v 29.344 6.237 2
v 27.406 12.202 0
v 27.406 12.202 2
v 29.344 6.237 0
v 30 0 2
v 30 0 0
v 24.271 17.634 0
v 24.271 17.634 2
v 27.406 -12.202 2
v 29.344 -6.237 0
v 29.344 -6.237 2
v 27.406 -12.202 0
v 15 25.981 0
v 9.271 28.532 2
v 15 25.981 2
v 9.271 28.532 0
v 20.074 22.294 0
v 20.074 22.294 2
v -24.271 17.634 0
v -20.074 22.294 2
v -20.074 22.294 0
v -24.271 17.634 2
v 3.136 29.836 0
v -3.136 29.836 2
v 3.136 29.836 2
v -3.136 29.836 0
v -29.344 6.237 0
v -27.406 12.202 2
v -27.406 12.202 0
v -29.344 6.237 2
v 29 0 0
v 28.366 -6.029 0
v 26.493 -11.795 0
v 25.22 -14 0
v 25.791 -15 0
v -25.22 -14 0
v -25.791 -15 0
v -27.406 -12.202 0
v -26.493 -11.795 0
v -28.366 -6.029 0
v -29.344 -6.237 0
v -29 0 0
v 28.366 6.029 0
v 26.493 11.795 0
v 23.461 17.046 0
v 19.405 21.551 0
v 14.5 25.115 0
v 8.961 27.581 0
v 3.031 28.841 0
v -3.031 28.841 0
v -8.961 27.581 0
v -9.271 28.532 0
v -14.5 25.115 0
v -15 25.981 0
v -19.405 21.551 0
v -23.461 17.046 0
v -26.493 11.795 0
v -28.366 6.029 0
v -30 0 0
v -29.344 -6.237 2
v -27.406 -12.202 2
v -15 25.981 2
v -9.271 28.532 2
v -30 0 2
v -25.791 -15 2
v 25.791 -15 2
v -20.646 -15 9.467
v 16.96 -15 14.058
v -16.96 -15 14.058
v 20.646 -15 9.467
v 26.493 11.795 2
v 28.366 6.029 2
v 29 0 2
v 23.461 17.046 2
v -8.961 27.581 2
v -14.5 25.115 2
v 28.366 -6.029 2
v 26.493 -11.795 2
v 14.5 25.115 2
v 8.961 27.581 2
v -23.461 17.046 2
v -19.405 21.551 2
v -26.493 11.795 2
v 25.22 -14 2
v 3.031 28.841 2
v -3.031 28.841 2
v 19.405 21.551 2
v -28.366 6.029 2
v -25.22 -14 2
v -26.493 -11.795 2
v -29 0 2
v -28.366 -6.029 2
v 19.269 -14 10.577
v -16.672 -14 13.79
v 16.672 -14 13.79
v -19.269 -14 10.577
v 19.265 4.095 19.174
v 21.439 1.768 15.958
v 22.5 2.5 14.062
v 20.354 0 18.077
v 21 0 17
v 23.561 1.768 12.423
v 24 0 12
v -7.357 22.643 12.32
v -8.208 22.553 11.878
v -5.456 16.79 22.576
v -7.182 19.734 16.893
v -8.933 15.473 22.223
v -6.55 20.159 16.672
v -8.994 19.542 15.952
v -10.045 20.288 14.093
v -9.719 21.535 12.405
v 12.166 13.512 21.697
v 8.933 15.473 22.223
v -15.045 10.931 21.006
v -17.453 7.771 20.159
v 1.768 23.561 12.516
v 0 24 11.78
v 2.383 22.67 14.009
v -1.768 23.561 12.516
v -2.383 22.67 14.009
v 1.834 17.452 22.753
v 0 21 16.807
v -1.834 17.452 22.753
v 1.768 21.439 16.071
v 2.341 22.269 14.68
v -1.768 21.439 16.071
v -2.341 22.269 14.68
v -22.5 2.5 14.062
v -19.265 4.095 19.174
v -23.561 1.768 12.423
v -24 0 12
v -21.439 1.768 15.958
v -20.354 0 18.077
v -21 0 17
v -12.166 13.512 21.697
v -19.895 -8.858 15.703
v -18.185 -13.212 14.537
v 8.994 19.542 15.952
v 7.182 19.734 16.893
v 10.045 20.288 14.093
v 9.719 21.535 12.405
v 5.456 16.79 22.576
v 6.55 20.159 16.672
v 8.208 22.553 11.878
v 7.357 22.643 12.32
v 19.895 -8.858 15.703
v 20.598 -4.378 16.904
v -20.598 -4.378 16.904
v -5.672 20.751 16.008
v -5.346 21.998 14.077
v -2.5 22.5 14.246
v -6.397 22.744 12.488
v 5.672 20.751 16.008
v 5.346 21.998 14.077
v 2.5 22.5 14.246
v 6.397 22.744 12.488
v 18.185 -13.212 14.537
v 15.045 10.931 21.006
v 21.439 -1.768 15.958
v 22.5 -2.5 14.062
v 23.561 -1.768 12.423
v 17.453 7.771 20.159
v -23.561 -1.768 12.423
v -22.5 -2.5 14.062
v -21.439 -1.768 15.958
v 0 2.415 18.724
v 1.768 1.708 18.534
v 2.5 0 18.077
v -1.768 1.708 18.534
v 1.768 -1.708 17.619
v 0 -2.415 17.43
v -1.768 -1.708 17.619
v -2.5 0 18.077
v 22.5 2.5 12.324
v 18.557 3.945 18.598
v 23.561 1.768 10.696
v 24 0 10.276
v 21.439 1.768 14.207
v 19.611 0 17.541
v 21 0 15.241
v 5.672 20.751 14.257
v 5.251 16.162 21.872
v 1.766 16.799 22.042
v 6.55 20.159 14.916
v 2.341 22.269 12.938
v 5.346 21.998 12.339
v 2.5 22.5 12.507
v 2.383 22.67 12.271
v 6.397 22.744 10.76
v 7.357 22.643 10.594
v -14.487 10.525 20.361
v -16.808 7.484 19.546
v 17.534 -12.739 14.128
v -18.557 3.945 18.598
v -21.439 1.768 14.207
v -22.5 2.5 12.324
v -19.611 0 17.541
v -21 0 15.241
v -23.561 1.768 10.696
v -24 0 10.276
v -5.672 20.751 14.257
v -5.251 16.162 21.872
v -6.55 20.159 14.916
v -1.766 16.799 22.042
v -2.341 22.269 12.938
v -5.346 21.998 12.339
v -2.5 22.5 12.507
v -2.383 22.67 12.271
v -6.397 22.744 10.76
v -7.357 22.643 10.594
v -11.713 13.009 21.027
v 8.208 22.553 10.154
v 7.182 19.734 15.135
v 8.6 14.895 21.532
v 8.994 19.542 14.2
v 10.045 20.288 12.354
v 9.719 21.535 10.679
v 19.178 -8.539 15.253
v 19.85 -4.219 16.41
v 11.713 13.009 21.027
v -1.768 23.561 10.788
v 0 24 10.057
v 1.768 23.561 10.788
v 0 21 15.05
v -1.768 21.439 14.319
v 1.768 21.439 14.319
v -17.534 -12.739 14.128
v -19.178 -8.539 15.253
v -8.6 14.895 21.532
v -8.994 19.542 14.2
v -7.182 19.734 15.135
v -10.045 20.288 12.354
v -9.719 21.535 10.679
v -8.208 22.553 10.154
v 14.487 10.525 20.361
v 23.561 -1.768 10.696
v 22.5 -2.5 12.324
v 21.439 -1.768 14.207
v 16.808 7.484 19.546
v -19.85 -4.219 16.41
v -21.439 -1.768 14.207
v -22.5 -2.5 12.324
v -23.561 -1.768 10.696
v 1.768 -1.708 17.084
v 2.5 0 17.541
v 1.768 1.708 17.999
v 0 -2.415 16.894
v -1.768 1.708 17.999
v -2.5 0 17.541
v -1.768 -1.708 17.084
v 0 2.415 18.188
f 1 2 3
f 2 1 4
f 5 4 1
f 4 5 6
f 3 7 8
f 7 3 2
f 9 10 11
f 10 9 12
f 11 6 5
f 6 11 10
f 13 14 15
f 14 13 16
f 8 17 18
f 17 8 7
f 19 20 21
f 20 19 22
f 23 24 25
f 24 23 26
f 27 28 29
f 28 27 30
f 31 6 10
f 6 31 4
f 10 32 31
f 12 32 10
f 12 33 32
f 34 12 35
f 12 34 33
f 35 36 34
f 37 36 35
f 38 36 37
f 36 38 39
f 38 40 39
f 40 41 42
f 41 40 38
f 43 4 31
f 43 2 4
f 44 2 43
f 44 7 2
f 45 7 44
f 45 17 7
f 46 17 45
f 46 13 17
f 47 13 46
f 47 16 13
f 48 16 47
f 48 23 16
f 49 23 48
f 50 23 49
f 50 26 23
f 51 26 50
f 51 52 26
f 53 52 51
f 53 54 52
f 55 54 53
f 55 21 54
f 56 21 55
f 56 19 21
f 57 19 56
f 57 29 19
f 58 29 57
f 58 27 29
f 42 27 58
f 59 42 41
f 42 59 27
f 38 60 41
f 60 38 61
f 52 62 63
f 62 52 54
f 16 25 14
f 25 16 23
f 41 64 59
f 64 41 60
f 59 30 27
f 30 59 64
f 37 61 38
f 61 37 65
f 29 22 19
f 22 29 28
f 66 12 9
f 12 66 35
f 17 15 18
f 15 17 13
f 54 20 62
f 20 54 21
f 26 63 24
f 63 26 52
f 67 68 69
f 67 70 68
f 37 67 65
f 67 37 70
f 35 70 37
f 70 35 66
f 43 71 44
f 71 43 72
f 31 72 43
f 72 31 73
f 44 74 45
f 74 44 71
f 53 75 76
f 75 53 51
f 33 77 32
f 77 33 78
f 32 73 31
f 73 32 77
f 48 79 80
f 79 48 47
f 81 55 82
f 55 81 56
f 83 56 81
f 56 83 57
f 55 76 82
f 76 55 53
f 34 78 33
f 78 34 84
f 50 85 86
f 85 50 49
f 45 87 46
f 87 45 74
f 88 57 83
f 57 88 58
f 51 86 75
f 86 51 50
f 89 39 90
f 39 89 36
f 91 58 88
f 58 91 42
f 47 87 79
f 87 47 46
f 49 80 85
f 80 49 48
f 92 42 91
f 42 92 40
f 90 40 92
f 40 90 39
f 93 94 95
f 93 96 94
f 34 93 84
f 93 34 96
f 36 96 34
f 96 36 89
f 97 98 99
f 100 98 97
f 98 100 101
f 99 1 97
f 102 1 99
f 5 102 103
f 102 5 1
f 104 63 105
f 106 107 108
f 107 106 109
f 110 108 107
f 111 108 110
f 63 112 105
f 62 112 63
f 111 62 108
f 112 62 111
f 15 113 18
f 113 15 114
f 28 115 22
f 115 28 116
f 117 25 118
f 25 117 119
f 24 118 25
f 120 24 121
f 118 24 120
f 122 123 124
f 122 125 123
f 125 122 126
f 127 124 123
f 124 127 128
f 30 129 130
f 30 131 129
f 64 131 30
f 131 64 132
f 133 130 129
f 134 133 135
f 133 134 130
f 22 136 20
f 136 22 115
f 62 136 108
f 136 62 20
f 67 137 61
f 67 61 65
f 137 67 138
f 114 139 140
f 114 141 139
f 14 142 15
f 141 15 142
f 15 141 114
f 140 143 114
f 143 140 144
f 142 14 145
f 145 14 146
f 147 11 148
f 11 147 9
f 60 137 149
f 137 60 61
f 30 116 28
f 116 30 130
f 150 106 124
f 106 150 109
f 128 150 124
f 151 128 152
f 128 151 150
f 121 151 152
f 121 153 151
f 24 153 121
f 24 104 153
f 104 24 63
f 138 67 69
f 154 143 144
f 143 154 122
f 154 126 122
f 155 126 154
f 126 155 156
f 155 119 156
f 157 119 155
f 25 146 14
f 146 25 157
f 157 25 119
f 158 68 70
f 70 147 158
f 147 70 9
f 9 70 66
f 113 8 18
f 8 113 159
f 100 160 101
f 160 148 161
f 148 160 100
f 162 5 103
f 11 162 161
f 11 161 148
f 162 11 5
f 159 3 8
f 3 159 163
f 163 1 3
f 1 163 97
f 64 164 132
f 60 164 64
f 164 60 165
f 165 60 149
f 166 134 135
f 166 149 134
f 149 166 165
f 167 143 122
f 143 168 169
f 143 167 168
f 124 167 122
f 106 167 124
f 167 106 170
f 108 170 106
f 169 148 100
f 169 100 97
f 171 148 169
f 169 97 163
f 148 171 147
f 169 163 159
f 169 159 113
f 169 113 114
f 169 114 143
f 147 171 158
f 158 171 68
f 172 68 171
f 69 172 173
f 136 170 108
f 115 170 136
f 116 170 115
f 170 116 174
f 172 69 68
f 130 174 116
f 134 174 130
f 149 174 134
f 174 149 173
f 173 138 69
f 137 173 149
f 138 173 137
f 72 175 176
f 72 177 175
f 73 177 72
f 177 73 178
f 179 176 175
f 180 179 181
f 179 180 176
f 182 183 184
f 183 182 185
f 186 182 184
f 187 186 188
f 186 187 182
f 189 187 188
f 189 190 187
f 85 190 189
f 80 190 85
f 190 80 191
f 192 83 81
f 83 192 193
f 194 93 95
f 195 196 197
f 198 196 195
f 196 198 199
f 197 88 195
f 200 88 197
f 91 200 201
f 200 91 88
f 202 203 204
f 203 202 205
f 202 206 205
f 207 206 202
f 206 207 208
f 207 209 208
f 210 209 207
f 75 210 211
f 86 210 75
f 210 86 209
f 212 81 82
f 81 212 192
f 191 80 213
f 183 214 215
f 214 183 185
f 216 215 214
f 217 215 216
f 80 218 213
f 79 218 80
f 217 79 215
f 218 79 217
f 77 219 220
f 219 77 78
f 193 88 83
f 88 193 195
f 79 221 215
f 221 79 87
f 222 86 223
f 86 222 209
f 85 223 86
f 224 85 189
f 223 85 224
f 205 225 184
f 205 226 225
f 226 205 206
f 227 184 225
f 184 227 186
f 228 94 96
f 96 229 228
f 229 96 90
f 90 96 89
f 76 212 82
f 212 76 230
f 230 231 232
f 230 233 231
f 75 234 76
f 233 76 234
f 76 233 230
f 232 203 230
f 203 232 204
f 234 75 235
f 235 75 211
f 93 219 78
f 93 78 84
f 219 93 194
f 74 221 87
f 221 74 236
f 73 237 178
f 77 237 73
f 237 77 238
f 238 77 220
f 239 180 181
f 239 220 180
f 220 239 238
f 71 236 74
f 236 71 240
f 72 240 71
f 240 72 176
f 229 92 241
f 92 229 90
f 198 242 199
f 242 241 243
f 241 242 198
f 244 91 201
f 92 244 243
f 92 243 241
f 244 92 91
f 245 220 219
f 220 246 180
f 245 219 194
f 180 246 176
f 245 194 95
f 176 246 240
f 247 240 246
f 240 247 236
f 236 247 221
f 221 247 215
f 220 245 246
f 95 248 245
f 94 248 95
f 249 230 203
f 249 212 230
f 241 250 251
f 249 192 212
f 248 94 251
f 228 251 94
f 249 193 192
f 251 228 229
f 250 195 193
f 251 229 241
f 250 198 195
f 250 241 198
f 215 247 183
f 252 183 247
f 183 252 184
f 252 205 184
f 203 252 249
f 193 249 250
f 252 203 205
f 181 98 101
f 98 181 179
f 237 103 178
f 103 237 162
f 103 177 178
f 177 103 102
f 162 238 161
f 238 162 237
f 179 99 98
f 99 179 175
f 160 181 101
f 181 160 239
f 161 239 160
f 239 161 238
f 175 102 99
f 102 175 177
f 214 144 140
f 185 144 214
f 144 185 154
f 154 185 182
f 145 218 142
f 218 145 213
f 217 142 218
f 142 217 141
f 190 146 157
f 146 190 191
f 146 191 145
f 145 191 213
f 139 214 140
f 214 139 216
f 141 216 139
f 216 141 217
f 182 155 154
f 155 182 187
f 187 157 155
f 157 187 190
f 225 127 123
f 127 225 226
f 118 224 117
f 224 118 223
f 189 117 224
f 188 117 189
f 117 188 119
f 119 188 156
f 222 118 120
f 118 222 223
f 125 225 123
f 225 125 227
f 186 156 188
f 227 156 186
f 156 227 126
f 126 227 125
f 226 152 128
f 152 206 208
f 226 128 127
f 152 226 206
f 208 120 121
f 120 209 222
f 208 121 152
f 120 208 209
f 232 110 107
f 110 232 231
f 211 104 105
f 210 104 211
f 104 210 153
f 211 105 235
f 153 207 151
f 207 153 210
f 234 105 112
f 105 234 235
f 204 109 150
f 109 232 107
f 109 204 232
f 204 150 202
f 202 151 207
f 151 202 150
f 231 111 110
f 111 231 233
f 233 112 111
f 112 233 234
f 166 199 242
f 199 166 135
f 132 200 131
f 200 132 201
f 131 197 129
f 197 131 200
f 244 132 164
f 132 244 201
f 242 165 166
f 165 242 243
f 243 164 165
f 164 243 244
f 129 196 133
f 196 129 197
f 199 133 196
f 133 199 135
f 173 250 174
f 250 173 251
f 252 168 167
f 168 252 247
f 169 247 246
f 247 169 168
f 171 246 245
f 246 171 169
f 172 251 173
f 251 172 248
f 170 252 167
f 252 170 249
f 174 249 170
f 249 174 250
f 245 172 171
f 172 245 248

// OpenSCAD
// Diameter at the bottom
ldia = 60; // [30:90]
// Maximum height
ht = 25; // [15:50]
// Defines the slope of the code 
cone_ht = 50; // [25:150]
// Angle of slope for top cut
back_slope = 15; // [0:45]
// Skin thickness
thickness = 2;  // [1:10]
// Platform on which the code rests
platform_ht = 2;  // [0:10]


module led_hole(slope, disp) {
    //rotate([0,0,-45]) 
    translate([0,disp, 0]) scale([1, slope, 1]) cylinder(d=5, h=2*ht);
}

module solid_shell(d, h) {
    difference () {
        cylinder(r1 = d/2, r2 = 0, h = h);
        translate([-d, -d, 0])
            rotate([back_slope,0,0])
                cube([2*d, 2*d, 4*d]);
        translate([-d/2, -d-d/2+15, 0])
            cube([d,d,4*d]);        
    }
}

module top_shell() {
    difference () {
        solid_shell(ldia, cone_ht);
        solid_shell(ldia-thickness, cone_ht-thickness);
        for (angle = [-90,-20,0,20,90])
            rotate([0,0,angle]) 
                led_hole(ldia/2/cone_ht, 3/8*ldia);
        led_hole(cos(back_slope), 0);
    }
}

module solid_platform(d, h) {
    difference () {
       cylinder(r = d/2, h = h);
        translate([-d/2, -d-d/2+15, 0])
            cube([d,d,4*d]);        
    } 
}

module platform() {
    difference () {
        solid_platform(ldia, platform_ht);
        solid_platform(ldia-thickness, platform_ht);
    }
}

union () {
    platform();
    translate([0,0, platform_ht]) top_shell();
}
